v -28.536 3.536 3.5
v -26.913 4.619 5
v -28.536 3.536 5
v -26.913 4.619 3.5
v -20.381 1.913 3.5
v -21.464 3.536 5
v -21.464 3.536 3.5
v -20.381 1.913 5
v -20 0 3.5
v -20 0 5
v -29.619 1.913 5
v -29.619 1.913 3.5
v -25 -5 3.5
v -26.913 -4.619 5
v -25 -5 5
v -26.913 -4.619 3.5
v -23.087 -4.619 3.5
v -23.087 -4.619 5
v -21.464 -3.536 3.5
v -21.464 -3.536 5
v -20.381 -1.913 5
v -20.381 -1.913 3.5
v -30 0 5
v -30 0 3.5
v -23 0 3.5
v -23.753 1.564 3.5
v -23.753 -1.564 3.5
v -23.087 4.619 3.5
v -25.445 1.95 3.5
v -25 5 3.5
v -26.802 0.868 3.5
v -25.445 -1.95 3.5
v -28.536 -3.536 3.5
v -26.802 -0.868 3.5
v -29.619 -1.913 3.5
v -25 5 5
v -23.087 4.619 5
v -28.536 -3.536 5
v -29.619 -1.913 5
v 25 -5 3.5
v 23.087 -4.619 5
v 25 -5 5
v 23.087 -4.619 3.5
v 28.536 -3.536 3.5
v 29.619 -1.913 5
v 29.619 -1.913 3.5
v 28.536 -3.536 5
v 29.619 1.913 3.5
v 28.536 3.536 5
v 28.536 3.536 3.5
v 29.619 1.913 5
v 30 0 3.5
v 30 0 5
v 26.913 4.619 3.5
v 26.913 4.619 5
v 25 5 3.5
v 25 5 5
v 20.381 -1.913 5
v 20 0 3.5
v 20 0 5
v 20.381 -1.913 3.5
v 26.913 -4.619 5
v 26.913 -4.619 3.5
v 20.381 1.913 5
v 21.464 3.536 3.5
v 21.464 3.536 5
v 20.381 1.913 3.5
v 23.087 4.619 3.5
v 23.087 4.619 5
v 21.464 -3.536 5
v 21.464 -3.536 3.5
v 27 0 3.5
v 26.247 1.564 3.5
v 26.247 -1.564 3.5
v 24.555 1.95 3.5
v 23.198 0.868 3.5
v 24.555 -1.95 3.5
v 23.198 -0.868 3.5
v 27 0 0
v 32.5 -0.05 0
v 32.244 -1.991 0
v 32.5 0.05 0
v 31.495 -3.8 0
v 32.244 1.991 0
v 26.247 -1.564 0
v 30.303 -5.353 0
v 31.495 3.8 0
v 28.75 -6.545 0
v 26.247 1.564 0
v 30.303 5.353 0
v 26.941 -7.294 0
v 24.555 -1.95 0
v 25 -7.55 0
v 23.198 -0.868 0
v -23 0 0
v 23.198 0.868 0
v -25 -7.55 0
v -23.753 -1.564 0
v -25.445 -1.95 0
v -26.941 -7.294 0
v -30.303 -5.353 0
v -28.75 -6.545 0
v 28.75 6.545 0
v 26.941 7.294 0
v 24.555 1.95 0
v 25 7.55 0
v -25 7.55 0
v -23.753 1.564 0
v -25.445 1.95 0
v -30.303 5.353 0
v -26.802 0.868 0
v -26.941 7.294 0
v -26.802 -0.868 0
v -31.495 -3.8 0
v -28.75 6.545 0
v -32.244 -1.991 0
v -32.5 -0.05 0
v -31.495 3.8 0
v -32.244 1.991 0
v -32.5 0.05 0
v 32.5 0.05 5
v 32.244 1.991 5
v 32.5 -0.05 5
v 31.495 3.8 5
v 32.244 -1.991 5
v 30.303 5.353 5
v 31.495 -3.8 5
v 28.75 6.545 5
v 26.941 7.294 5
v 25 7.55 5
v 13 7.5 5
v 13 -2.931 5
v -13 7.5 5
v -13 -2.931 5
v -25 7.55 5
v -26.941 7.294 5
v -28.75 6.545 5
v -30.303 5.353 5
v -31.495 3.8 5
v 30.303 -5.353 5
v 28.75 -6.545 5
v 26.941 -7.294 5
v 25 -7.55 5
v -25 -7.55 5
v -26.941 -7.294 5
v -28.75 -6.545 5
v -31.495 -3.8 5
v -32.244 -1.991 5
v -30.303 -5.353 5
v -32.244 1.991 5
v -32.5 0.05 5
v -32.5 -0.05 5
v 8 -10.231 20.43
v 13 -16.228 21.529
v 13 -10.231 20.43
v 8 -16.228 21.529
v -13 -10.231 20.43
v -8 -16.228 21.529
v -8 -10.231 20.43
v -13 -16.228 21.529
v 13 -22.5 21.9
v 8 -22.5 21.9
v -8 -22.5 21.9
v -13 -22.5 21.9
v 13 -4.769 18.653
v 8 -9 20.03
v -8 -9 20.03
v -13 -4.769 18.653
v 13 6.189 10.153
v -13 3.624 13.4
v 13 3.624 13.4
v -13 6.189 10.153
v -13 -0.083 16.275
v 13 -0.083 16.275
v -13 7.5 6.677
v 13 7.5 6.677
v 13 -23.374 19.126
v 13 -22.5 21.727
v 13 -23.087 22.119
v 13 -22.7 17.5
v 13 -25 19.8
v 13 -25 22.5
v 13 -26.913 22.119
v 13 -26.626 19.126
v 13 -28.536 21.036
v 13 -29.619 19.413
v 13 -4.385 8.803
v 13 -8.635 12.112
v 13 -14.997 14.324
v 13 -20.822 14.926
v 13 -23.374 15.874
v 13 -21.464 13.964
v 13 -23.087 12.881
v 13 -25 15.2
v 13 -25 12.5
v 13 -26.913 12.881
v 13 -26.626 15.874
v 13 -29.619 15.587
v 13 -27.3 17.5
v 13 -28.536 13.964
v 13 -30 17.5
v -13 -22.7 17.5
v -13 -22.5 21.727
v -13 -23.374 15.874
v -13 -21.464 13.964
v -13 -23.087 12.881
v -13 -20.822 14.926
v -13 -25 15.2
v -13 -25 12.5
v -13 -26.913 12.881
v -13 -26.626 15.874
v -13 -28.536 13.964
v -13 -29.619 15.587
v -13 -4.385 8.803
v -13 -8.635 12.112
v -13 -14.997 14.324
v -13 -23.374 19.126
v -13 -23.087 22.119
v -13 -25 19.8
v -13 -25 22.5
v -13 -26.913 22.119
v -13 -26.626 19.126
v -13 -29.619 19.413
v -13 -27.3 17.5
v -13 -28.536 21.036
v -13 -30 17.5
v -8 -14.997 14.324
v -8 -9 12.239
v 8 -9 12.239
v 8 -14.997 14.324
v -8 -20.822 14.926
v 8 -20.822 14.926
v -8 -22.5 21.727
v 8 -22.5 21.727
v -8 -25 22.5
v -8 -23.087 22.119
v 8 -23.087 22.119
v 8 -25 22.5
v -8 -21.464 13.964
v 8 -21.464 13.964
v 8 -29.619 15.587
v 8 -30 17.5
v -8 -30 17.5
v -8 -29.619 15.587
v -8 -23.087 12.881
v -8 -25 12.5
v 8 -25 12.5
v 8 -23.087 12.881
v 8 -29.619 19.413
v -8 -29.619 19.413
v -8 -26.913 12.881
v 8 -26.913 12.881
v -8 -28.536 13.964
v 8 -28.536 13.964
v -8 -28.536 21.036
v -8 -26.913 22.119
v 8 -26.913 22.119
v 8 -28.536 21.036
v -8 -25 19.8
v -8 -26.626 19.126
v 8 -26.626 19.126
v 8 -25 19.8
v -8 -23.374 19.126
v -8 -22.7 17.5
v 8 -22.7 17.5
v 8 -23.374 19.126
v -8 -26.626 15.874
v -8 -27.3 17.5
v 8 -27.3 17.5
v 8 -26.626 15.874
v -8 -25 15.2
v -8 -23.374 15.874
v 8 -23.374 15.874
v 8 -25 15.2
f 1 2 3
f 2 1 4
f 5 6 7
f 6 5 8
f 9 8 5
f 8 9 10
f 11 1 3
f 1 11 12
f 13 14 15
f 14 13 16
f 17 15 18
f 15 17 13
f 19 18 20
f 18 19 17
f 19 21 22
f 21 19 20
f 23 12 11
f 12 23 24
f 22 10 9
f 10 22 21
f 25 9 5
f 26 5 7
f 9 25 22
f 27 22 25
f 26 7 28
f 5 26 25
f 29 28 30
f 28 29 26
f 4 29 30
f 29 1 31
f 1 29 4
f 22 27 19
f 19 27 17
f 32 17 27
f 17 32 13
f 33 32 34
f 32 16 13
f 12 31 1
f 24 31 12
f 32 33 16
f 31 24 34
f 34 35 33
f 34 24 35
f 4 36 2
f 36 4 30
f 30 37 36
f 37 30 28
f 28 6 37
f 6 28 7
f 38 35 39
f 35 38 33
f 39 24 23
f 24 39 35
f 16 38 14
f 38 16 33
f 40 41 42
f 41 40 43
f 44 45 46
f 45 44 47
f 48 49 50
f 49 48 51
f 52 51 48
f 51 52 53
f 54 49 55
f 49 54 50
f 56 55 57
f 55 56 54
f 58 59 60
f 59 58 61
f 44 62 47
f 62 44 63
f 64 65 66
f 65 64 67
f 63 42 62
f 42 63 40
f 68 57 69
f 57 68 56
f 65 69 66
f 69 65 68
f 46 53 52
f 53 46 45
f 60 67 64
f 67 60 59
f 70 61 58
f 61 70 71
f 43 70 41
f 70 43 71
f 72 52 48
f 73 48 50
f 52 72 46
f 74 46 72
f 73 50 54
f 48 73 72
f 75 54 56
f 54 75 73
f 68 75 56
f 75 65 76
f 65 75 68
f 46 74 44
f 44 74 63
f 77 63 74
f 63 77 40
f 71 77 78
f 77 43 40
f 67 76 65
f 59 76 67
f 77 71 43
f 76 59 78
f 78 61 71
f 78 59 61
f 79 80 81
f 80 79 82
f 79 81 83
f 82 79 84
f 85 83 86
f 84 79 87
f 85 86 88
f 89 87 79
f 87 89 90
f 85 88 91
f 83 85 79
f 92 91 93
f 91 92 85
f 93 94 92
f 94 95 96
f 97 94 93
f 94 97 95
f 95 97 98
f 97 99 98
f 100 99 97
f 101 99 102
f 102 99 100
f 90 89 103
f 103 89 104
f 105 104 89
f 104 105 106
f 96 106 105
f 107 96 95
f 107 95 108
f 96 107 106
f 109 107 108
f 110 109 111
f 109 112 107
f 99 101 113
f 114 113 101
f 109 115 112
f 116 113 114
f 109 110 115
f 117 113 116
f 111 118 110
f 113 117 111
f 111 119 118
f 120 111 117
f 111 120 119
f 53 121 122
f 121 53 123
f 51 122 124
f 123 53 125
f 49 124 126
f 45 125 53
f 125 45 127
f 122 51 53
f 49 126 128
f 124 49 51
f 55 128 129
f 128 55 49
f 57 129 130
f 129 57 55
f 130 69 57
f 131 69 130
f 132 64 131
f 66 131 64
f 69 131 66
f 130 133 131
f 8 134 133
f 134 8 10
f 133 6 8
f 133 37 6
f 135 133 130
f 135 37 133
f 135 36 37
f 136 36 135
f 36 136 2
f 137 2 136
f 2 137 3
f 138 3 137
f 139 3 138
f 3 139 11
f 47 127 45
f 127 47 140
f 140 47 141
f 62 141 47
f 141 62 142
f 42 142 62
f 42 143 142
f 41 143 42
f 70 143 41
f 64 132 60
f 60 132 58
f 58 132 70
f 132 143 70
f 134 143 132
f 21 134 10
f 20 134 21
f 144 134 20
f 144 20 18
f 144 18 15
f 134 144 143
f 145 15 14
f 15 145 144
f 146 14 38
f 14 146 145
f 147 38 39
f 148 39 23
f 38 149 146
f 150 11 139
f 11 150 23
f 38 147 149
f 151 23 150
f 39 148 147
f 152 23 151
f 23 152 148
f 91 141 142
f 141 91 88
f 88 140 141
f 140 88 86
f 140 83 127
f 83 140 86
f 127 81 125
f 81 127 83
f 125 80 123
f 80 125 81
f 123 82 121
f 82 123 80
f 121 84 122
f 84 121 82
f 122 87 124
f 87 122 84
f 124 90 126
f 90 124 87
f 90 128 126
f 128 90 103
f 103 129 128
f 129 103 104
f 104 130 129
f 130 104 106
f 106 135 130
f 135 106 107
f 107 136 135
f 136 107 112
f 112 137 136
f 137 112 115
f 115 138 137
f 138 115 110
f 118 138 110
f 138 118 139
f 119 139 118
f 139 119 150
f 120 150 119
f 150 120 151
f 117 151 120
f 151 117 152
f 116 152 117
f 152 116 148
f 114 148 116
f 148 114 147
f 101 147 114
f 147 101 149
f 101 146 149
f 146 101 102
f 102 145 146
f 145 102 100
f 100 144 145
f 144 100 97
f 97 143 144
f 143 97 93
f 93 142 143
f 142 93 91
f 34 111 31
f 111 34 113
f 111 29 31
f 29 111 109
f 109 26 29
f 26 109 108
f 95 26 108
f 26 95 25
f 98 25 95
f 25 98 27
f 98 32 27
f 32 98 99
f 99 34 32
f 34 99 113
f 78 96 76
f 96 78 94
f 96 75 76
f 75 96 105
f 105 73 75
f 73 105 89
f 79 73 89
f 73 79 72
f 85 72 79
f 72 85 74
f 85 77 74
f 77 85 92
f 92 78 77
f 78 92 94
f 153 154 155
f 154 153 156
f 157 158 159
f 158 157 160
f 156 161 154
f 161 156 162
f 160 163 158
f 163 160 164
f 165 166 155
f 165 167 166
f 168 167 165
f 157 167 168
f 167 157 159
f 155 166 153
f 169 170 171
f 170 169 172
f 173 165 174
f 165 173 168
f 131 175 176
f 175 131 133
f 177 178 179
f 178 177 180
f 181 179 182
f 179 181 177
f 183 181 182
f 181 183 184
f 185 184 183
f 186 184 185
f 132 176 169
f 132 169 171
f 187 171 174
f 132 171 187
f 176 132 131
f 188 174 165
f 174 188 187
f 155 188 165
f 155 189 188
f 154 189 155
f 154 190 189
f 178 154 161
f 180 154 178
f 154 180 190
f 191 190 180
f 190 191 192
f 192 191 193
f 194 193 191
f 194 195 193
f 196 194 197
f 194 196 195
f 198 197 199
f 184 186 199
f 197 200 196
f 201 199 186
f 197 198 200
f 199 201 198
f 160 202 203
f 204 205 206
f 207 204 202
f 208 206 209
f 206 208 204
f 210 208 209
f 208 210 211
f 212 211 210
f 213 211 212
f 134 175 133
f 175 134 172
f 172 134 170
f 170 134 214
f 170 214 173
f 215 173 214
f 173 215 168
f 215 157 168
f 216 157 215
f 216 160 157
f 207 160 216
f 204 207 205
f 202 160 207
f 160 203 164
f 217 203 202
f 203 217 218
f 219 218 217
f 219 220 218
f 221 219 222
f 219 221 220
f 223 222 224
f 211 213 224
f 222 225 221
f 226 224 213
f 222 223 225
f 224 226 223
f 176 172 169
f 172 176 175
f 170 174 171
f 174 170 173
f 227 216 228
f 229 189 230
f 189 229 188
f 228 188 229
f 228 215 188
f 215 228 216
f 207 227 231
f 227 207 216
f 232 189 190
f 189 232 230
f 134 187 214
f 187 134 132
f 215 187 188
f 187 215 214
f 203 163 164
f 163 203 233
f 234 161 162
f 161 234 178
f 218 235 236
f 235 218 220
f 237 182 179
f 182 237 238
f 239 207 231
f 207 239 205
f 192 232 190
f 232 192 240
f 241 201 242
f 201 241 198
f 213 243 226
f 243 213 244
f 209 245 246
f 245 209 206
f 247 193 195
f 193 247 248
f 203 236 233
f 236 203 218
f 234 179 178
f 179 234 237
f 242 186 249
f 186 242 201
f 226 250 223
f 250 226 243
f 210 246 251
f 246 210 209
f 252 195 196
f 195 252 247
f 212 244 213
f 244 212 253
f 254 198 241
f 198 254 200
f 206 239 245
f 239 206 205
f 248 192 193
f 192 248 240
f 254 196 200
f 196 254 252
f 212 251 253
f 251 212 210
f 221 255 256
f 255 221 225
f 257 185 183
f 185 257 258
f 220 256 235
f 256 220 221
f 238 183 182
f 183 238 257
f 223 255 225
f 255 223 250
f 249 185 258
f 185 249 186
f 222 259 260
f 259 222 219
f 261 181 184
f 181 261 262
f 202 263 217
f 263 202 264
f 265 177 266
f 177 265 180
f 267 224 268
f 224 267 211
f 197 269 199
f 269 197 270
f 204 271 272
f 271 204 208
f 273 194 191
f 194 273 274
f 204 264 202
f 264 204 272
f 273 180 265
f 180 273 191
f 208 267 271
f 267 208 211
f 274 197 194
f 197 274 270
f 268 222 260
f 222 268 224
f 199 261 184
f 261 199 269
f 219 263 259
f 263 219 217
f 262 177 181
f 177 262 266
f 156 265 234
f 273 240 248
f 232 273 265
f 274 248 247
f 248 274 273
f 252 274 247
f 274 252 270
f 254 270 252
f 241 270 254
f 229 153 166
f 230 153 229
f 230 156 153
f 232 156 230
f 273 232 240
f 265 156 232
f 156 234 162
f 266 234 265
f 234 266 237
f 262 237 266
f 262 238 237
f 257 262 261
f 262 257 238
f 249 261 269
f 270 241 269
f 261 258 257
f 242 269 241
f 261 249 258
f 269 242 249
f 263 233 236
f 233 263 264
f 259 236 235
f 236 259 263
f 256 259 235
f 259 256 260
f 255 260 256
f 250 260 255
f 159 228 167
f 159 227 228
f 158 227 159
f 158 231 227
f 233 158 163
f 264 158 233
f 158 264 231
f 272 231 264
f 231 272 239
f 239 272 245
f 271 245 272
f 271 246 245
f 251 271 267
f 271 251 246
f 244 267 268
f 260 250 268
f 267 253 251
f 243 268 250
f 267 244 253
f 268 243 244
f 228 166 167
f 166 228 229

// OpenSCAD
module WebCamMount(
espCam=16,
dimTor=4.6
){

    difference(){
        linear_extrude(height=5)
        difference(){
            minkowski(){
             
             square([50,0.1],center=true);
             circle(d=15);   
            }
            translate([-25,0])
            for(d=[0:1]){
               translate([50*d,0])
               circle(d=4);
            }
        }
         translate([-25,0,3.5])
            for(d=[0:1]){
               translate([50*d,0,0])
               cylinder(d=10,h=10);
            }
    }

    esp=5;
    diam=10;

    lonX=espCam+(2*esp);

    difference(){
        union(){
            translate([0,-22.5,4.9])
            rotate([0,-90,0])
            resize([17,30,lonX])
            intersection(){
                difference(){
                     cylinder(d=diam+(2*esp),h=lonX,center=true);
                     scale([1.2,1.3,1])
                     cylinder(d=diam,h=lonX*2,center=true);
                }
                translate([0,0,-lonX*3])
                cube([lonX*6,lonX*6,lonX*6]);
            }
            translate([0,-25,17.5])
            rotate([0,90,0])
            cylinder(d=10,h=lonX,center=true);
        }
        //agujero tornillo 
        translate([0,-25,17.5])
            rotate([0,90,0])
            cylinder(d=dimTor,h=lonX*2,center=true);
        
        //Espacio Camara
         translate([0,-25,0])
        cube([espCam,espCam*2,300],center=true);
    }
}

WebCamMount(
espCam=16,
dimTor=4.6
);
